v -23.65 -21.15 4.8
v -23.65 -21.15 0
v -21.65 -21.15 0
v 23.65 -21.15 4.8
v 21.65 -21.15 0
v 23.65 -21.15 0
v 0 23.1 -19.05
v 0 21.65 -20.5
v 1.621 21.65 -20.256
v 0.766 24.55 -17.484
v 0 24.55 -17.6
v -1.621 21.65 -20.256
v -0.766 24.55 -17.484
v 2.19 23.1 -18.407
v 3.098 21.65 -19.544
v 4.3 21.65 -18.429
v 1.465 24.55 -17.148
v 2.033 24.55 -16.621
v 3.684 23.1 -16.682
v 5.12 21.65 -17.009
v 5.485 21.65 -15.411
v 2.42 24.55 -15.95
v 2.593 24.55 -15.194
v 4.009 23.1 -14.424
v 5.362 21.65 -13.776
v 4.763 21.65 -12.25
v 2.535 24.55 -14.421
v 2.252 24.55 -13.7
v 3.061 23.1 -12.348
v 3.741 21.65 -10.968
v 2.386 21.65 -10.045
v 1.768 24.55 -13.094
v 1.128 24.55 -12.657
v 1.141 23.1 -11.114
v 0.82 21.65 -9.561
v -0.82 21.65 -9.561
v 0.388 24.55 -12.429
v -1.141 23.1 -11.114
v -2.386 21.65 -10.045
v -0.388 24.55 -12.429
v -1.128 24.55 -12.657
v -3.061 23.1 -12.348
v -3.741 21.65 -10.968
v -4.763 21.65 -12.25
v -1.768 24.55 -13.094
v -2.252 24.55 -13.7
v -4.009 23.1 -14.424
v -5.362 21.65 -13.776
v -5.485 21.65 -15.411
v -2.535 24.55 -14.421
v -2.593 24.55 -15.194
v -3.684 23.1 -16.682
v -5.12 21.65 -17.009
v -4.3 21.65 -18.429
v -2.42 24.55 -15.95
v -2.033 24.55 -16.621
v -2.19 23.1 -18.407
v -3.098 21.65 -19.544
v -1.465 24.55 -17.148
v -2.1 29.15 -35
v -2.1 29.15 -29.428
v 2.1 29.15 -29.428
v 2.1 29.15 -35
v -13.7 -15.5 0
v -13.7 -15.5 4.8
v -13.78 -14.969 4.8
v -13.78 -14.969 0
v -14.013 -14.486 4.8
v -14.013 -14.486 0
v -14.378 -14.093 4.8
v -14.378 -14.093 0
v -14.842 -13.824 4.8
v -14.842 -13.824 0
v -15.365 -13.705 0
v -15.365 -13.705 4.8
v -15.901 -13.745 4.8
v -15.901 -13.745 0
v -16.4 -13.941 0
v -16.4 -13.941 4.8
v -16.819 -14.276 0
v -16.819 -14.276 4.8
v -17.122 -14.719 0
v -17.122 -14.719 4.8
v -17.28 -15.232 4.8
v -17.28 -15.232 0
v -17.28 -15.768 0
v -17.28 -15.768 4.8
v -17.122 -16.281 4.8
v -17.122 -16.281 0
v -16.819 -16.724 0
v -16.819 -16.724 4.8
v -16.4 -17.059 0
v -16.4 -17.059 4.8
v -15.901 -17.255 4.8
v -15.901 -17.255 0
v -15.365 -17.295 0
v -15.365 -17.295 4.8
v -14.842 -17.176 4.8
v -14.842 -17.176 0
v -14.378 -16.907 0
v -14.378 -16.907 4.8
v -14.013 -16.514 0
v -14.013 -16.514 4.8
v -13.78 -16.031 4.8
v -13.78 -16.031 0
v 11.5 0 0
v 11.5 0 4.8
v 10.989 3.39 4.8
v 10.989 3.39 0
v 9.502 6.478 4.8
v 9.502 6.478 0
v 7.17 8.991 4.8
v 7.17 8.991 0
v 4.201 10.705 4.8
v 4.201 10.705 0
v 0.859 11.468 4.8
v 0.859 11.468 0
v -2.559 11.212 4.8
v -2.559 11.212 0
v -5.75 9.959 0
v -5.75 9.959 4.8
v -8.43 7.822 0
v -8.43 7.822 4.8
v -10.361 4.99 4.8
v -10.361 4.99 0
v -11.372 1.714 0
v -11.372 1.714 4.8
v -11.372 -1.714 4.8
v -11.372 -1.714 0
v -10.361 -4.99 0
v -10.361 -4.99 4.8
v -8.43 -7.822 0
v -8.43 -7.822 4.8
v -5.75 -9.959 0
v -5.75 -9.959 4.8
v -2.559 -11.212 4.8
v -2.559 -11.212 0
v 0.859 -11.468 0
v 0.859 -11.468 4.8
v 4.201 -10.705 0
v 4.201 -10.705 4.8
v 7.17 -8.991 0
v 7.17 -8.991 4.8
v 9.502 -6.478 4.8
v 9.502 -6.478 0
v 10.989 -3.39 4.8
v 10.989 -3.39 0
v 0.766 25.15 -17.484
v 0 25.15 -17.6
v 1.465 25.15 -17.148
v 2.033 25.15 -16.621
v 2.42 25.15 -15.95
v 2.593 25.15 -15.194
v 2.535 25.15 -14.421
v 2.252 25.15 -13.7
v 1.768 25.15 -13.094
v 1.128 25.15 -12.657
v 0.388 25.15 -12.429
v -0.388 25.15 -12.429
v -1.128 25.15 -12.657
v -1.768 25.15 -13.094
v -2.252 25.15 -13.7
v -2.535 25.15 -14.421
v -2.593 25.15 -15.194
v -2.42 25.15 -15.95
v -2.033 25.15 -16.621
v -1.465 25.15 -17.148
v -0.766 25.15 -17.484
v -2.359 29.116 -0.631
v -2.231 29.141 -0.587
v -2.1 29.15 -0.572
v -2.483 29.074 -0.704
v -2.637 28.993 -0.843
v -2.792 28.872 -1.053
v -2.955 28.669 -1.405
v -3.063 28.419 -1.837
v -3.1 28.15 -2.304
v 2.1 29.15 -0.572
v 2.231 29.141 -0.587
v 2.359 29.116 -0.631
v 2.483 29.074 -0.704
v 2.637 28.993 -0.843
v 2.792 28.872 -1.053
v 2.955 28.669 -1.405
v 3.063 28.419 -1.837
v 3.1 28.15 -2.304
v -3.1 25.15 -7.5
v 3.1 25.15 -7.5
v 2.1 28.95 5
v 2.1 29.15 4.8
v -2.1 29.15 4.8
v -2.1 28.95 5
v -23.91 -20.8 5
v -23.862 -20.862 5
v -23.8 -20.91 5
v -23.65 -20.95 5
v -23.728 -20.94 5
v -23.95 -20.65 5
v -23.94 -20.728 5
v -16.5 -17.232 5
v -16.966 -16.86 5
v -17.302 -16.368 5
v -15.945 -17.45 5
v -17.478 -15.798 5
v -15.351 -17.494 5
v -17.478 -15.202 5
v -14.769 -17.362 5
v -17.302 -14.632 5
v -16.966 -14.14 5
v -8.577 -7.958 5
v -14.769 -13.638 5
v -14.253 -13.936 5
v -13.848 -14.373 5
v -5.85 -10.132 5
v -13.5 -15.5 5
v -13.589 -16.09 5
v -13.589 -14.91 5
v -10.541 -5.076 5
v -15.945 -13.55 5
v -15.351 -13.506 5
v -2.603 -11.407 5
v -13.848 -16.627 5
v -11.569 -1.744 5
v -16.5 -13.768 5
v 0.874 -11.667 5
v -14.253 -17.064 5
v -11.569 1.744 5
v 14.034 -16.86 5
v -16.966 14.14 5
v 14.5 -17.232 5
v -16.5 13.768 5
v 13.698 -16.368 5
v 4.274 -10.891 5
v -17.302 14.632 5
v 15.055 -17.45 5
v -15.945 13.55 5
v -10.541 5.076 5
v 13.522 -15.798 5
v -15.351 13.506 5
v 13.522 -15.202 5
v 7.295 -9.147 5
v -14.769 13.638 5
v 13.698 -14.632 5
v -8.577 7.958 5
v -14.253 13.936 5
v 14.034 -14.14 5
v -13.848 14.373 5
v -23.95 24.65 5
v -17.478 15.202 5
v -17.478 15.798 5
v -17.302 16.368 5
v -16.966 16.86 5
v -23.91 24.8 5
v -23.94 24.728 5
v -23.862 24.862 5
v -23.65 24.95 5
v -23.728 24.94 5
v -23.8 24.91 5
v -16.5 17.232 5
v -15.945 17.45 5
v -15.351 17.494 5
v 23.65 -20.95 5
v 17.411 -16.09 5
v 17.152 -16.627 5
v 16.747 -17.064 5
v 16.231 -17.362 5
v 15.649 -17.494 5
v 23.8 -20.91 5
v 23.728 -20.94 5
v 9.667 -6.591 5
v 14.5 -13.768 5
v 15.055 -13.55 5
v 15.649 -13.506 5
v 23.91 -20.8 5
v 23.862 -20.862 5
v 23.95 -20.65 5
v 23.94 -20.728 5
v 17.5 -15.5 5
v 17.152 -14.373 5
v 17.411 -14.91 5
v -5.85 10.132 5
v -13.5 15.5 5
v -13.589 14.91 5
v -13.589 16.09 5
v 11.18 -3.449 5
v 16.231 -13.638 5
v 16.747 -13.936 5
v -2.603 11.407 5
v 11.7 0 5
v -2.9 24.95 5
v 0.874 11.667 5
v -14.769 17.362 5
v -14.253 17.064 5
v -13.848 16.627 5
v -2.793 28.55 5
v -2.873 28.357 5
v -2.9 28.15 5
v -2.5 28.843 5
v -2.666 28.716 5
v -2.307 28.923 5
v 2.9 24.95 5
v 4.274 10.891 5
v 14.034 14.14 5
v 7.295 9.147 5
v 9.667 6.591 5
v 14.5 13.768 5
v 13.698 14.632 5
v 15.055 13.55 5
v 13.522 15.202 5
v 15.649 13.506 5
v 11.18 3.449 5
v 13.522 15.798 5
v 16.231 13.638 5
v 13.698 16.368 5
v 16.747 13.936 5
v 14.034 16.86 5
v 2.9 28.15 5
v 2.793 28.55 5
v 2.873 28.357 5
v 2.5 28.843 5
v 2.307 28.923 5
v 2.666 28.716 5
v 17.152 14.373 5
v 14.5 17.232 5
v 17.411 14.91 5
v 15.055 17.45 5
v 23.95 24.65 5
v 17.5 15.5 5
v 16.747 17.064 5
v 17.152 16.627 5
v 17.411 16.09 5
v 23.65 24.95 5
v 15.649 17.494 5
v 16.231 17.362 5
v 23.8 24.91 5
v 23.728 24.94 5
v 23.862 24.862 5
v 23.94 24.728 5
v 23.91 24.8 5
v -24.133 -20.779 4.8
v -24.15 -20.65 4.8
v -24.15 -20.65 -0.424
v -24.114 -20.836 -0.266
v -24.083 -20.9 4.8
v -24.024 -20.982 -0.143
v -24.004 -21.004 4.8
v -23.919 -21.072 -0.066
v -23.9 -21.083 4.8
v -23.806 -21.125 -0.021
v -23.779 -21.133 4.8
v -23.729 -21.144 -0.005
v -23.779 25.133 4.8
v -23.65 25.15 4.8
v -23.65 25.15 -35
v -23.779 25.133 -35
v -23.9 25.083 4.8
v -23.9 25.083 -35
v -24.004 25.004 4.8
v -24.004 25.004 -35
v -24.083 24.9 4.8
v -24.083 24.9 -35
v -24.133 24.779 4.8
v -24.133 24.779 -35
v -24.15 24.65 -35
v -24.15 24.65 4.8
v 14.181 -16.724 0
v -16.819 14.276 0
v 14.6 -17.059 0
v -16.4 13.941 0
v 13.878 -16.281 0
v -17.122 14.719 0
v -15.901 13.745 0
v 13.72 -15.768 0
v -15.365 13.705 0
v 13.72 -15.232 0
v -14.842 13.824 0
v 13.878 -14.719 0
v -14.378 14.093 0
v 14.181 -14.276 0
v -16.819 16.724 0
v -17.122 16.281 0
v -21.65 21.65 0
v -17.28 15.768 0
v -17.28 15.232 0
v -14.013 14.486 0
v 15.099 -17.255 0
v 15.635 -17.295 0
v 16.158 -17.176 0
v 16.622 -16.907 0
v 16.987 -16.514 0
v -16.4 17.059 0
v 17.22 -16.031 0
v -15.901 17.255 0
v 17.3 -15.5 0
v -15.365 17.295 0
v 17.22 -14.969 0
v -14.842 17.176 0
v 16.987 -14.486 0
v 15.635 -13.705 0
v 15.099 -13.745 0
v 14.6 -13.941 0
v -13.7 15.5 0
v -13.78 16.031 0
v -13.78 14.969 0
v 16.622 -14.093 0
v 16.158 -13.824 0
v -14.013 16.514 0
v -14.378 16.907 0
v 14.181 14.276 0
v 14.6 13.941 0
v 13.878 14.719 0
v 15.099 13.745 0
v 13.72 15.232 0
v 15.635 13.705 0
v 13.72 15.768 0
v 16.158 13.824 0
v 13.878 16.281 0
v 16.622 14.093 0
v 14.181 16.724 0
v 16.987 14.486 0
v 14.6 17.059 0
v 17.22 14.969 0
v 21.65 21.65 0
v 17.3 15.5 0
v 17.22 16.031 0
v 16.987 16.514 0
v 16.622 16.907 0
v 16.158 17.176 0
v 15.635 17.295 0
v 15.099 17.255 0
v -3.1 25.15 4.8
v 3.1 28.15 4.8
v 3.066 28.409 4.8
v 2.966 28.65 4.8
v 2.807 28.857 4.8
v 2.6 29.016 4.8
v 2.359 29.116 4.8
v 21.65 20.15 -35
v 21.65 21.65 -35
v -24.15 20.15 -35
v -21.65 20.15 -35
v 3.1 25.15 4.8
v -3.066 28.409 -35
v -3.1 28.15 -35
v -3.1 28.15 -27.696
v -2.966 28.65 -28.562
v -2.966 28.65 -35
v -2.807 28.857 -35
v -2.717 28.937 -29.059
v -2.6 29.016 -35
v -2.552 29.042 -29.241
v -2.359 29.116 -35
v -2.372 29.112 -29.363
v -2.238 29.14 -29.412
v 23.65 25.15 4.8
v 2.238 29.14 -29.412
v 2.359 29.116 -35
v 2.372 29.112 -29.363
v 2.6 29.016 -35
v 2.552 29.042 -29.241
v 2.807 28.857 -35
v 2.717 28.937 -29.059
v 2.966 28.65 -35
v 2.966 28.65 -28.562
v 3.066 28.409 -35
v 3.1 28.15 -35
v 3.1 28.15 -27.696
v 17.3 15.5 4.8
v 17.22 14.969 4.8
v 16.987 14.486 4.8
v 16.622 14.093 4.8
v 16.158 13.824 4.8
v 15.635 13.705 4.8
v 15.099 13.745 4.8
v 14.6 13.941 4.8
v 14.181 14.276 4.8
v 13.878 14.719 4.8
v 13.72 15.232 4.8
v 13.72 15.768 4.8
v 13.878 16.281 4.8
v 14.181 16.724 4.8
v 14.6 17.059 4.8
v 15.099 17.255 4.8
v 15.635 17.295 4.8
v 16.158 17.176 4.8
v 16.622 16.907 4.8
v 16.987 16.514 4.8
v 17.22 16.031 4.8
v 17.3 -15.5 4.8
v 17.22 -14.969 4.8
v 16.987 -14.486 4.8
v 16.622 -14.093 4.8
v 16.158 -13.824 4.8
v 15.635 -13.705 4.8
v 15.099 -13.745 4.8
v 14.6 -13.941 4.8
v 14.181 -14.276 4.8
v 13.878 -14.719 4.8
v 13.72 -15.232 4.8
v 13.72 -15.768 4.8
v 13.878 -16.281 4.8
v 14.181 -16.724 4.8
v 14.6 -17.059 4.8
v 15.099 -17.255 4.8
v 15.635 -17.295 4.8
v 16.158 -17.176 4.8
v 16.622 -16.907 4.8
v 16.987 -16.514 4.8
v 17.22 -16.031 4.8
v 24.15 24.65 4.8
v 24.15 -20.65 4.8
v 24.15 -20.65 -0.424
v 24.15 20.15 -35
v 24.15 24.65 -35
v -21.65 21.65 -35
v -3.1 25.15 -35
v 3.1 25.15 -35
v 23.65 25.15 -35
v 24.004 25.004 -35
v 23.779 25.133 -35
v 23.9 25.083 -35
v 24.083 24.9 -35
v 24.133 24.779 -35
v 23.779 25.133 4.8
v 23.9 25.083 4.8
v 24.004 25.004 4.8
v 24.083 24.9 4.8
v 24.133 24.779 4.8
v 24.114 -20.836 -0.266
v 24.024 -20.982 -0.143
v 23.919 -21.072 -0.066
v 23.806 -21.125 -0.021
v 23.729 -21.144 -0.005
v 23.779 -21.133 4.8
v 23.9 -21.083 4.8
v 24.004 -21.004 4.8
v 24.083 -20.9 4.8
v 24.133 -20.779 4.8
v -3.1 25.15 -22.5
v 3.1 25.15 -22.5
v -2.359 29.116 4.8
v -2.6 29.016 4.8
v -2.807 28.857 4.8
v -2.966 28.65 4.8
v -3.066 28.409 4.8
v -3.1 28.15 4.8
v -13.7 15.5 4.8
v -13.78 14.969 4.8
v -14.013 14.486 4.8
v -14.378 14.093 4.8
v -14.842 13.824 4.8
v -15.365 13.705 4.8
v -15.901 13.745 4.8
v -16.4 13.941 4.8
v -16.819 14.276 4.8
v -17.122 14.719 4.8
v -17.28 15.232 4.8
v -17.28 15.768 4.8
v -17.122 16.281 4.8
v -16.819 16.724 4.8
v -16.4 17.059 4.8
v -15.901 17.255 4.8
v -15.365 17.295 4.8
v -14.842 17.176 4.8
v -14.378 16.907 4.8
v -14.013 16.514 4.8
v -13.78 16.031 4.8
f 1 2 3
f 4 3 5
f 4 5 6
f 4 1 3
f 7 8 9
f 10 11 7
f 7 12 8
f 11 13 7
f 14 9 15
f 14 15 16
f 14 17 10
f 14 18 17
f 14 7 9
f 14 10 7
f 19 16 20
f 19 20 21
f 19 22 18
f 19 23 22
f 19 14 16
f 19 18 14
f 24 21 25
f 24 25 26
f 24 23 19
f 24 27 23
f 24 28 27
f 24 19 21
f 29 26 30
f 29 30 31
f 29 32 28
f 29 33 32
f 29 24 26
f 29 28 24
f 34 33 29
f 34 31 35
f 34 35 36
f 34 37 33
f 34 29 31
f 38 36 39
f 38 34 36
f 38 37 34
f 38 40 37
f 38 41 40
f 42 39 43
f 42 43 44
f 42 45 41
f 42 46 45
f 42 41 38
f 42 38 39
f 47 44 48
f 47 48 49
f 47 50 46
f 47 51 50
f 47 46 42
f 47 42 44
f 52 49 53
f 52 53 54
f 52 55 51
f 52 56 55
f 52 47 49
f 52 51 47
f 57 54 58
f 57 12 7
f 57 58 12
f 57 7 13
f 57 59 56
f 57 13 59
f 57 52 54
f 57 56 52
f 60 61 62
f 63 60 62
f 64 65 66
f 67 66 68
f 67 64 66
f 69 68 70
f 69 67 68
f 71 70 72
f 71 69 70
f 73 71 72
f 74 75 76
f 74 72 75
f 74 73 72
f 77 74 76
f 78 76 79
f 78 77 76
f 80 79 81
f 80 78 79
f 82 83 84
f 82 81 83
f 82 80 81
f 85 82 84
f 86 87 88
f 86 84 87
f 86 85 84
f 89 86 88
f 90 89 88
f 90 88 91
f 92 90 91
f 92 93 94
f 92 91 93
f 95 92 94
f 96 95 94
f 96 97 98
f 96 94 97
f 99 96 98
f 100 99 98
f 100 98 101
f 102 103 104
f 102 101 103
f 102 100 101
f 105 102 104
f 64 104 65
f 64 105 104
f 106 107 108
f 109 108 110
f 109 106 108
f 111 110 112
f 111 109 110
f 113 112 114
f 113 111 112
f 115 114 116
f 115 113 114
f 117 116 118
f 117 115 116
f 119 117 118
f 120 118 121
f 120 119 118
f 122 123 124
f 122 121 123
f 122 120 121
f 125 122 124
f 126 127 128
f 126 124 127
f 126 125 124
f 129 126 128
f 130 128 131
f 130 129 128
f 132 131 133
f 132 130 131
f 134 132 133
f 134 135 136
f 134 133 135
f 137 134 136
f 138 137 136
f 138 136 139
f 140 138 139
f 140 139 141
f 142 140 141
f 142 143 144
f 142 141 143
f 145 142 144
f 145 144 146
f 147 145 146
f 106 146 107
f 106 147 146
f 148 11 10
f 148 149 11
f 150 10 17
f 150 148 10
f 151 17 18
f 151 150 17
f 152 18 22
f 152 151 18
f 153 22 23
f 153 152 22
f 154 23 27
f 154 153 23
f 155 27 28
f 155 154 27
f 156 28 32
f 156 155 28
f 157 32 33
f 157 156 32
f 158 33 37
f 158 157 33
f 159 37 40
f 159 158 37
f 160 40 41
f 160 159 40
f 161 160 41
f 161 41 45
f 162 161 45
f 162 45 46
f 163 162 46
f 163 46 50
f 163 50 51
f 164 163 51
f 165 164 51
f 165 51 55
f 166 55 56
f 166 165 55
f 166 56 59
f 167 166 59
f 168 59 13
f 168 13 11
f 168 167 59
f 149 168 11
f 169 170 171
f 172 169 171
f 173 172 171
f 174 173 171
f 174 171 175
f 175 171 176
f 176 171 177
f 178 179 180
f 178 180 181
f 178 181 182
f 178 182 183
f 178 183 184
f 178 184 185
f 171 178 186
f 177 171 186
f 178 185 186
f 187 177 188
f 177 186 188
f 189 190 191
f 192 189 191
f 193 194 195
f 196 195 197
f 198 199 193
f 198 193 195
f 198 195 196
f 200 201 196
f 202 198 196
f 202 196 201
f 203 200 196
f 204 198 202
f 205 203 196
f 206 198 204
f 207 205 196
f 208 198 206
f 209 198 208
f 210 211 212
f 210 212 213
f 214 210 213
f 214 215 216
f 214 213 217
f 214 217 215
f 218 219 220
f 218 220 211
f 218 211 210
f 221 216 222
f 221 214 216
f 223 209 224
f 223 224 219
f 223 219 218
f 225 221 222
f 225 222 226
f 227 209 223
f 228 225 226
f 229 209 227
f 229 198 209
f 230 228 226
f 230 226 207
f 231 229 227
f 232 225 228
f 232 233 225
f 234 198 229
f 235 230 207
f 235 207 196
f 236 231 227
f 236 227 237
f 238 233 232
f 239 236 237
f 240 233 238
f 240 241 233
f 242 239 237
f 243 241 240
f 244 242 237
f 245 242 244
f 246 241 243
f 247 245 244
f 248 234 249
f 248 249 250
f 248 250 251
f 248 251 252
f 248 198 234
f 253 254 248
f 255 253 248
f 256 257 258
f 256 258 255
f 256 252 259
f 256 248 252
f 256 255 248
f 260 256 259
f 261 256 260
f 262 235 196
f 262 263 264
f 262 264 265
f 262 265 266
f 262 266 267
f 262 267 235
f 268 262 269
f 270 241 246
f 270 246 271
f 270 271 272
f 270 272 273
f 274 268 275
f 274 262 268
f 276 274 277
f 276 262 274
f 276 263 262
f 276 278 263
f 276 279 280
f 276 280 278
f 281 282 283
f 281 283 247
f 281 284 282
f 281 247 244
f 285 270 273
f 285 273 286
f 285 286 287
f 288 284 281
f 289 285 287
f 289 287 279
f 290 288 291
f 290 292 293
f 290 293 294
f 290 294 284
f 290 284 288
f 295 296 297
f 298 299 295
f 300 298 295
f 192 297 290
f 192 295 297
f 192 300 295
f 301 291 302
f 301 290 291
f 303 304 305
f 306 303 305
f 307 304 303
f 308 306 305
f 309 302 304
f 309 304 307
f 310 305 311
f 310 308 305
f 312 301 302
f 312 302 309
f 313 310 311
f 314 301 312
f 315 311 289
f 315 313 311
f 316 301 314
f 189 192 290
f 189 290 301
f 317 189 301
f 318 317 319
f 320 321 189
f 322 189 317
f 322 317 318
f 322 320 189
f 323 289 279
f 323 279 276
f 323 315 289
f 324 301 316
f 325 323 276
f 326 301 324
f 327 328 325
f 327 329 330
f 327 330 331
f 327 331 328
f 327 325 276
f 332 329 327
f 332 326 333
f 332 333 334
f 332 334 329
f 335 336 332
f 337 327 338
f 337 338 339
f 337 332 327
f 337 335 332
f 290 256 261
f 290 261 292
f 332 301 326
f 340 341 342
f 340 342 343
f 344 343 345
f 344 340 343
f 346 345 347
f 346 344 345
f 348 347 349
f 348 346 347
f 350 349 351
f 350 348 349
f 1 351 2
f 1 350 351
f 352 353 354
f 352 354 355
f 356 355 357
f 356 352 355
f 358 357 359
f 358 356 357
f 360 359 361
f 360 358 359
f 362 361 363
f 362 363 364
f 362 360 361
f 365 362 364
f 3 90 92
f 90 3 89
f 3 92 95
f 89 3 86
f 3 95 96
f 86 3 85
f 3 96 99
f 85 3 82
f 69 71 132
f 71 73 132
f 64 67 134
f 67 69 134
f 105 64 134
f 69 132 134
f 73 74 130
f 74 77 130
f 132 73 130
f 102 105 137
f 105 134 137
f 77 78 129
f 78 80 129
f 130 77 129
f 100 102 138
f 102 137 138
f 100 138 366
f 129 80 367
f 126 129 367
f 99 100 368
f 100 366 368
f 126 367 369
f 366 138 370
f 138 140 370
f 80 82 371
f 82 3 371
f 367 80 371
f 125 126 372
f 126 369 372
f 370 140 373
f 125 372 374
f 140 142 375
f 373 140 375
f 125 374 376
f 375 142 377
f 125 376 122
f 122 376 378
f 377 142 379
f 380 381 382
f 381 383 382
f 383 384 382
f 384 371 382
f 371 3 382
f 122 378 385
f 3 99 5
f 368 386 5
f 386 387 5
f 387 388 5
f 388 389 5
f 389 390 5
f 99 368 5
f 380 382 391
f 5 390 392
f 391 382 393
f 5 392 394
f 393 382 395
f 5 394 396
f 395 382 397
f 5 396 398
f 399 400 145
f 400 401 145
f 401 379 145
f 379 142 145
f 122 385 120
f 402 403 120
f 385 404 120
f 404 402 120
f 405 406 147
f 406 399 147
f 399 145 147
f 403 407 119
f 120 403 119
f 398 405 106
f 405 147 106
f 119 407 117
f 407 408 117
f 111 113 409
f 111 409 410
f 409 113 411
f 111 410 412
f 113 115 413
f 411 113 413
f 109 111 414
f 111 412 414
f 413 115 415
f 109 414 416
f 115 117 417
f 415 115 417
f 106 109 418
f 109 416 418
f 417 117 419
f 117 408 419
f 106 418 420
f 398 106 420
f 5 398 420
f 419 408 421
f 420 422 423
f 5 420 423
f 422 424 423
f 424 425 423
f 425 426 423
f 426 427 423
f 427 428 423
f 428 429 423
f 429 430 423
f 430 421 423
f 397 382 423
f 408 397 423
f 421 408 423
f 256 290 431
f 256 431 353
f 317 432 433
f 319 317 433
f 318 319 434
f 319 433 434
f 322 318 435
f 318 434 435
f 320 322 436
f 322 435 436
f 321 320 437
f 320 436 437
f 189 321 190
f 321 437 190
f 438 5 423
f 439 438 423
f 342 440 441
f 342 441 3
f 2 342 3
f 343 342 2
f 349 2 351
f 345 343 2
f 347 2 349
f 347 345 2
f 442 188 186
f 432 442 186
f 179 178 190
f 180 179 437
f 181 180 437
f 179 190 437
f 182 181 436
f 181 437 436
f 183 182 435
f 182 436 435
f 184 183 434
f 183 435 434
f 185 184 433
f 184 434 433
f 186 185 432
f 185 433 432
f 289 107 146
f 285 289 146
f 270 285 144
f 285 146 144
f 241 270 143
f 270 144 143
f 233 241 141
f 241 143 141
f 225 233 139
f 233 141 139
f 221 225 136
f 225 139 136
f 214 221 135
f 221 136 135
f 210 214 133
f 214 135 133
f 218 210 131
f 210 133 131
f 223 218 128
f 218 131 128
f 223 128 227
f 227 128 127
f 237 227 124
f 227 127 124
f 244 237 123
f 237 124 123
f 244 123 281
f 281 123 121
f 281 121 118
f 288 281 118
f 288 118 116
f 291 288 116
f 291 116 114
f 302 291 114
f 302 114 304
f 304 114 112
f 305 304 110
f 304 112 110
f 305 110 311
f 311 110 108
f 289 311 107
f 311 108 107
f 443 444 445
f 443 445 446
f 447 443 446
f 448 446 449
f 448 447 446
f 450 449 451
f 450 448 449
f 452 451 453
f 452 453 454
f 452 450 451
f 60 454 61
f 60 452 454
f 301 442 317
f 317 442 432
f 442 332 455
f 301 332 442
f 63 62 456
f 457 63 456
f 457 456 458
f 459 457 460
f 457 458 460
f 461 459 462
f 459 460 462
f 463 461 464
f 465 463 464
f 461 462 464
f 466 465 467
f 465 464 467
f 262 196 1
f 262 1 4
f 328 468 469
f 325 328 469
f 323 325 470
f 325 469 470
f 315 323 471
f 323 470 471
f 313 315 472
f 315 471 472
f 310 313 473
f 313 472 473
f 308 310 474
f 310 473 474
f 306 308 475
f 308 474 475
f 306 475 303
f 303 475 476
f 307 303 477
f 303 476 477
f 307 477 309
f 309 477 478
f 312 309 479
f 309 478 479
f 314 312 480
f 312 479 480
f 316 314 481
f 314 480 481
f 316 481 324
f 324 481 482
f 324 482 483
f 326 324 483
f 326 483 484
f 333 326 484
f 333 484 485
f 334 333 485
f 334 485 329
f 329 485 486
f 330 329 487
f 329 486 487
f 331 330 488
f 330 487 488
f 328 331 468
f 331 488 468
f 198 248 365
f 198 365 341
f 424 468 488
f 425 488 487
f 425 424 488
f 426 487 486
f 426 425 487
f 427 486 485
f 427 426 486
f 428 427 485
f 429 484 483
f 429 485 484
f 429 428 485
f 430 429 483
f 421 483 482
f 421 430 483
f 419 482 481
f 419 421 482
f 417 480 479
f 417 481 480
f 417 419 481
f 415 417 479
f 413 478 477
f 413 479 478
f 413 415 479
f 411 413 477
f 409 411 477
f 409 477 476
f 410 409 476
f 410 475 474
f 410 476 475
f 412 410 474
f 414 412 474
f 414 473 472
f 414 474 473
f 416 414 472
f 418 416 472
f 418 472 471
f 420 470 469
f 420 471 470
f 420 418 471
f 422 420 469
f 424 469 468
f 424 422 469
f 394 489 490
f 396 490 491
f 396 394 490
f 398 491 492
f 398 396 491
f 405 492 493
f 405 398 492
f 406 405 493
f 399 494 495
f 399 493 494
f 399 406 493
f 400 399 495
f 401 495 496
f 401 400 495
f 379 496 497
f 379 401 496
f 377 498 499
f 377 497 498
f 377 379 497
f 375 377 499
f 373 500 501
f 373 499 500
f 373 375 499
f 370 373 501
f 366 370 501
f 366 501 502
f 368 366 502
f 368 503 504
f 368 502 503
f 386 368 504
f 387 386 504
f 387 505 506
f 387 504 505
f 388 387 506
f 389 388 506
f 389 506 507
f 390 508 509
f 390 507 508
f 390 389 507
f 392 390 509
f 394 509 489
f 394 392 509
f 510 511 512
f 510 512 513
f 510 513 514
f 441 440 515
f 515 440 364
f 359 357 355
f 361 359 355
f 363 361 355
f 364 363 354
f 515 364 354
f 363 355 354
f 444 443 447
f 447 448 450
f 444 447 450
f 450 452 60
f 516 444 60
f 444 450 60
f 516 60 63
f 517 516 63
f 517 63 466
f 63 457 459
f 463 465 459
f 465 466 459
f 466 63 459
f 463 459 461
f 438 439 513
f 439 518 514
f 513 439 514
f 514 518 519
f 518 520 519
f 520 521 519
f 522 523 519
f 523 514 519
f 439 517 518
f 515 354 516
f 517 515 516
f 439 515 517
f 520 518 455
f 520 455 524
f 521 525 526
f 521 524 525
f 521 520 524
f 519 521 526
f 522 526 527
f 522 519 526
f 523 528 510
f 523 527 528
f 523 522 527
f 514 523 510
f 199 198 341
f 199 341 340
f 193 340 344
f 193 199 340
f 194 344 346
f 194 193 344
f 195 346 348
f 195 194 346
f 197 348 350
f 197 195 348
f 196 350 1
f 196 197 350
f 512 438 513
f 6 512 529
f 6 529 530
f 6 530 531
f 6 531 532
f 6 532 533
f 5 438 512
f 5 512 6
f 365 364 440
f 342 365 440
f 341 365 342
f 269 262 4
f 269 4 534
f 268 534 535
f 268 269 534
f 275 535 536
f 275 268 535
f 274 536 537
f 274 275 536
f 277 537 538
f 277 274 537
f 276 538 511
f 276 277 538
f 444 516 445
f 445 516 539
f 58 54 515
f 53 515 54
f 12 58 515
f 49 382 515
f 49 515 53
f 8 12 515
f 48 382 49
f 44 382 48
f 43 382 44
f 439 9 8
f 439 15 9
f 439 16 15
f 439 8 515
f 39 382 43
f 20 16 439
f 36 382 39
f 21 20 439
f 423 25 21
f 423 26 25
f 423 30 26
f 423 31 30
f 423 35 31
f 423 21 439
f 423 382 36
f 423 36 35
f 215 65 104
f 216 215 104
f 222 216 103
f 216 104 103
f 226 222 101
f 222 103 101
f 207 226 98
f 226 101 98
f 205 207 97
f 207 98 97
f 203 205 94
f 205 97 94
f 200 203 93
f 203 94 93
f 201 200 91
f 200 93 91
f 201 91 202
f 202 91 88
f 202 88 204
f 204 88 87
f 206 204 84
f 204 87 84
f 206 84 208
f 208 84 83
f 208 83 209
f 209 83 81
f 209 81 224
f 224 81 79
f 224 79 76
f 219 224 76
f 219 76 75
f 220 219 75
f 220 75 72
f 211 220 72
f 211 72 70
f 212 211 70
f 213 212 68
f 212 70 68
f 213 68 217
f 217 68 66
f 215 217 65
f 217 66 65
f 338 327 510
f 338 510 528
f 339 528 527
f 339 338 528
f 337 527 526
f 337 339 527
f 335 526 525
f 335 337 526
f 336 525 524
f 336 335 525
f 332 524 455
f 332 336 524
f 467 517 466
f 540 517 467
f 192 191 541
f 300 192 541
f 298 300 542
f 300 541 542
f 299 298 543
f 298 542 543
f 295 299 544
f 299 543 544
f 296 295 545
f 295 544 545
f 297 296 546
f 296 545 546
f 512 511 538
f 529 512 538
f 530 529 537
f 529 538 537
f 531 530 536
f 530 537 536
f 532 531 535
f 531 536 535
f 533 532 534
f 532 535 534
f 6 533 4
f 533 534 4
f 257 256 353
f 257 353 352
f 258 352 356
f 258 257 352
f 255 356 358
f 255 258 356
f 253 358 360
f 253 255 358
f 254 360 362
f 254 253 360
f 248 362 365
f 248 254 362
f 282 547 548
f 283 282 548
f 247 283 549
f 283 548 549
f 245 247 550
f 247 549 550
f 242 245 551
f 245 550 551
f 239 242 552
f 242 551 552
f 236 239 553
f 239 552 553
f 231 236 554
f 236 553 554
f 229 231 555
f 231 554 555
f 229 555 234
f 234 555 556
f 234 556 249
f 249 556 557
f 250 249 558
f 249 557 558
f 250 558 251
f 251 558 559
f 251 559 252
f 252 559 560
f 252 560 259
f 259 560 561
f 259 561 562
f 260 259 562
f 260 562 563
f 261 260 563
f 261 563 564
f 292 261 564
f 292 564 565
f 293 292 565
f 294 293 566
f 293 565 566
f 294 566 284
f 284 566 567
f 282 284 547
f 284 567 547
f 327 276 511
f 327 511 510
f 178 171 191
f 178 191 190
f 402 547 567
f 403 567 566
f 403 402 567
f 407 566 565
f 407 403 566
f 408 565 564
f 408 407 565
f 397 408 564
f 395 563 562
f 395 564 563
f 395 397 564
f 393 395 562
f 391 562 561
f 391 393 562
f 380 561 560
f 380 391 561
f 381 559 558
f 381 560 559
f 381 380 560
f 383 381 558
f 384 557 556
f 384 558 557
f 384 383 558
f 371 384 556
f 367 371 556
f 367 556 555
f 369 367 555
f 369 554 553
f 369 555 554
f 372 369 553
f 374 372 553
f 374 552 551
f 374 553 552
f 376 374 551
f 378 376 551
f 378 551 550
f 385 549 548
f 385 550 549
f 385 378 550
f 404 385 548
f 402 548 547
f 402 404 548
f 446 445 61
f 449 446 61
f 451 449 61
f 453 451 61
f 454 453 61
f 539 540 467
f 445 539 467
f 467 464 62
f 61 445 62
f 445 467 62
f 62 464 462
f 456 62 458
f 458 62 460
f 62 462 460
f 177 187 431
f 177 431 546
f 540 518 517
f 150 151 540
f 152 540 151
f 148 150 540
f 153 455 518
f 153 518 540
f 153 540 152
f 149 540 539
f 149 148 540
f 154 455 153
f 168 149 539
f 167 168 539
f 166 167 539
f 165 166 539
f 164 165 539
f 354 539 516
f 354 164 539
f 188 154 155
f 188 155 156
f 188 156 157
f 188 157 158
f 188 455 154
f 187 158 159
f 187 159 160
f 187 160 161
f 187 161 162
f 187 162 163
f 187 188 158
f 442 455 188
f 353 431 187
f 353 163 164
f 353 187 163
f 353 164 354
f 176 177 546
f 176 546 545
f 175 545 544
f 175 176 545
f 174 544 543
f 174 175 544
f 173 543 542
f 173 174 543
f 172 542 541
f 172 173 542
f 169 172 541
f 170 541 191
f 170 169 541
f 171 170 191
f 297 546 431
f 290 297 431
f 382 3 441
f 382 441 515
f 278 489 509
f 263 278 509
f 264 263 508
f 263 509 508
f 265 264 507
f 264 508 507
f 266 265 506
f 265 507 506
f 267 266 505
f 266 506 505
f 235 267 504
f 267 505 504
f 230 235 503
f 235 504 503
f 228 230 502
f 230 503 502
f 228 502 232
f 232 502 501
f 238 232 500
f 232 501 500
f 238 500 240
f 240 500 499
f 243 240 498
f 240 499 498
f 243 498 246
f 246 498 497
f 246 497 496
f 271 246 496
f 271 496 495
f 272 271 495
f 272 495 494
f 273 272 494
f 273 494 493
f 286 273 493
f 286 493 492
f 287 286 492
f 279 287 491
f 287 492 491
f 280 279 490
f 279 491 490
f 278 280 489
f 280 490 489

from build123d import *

# Parameters (mm, degrees)
F1_W          = 6.2
F1_H          = 4
F2_DEPTH      = 5
F2_DEPTH_BACK = 35
F3_R          = 1
F5_DEPTH      = 24.151
F5_DEPTH_BACK = 24.151
F6_W          = 43.3
F6_H          = 43.3
F6_R          = 1.8
F6_R_2        = 11.5
F7_DEPTH      = 35.001
F8_DEPTH      = 5.001
F12_R         = 0.5
F13_SIZE      = 0.2


# Not quite as in the source:
# - a feature of the source that left no trace in its solid (it failed there, or was rolled back) is left out


with BuildPart() as f2:
    # F1 (on Top) → F2 (new body, two sides)
    with BuildSketch(Plane.XY) as f2_sk:
        Polygon((-24.15, 25.15), (-24.15, -21.15), (24.15, -21.15), (24.15, 25.15), (3.1, 25.15), (-3.1, 25.15), align=None)
        with Locations((0, 27.15)):
            Rectangle(F1_W, F1_H)
    extrude(amount=F2_DEPTH)
    extrude(f2_sk.sketch, amount=-F2_DEPTH_BACK)

    # F3
    f3_edges = [f2.edges().sort_by_distance(p)[0] for p in [
        (-3.1, 29.15, -15),
        (3.1, 29.15, -15),
    ]]
    fillet(f3_edges, radius=F3_R)

    # F4 (on Right) → F5 (cut, two sides)
    with BuildSketch(Plane.YZ) as f5_sk:
        Polygon((20.15, -35), (-21.15, 0), (-21.15, -35), align=None)
        Polygon((34.9199817246, 9.422104736), (25.15, -7.5), (25.15, -22.5), (34.9199817246, -39.422104736), align=None)
    extrude(amount=-F5_DEPTH, mode=Mode.SUBTRACT)
    extrude(f5_sk.sketch, amount=F5_DEPTH_BACK, mode=Mode.SUBTRACT)

    # F6 (on Top) → F7 (cut, through all)
    with BuildSketch(Plane.XY):
        Rectangle(F6_W, F6_H)
        with Locations((-15.5, -15.5)):
            Circle(F6_R, mode=Mode.SUBTRACT)
        with Locations((15.5, -15.5)):
            Circle(F6_R, mode=Mode.SUBTRACT)
        with Locations((-15.5, 15.5)):
            Circle(F6_R, mode=Mode.SUBTRACT)
        Circle(F6_R_2, mode=Mode.SUBTRACT)
        with Locations((15.5, 15.5)):
            Circle(F6_R, mode=Mode.SUBTRACT)
        with Locations((-15.5, -15.5)):
            Circle(F6_R)
        with Locations((-15.5, 15.5)):
            Circle(F6_R)
        Circle(F6_R_2)
        with Locations((15.5, 15.5)):
            Circle(F6_R)
        with Locations((15.5, -15.5)):
            Circle(F6_R)
    extrude(amount=-F7_DEPTH, mode=Mode.SUBTRACT)

    # F6 (on Top) → F8 (cut, through all)
    with BuildSketch(Plane.XY):
        Circle(F6_R_2)
        with Locations((-15.5, -15.5)):
            Circle(F6_R)
        with Locations((15.5, -15.5)):
            Circle(F6_R)
        with Locations((15.5, 15.5)):
            Circle(F6_R)
        with Locations((-15.5, 15.5)):
            Circle(F6_R)
    extrude(amount=F8_DEPTH, mode=Mode.SUBTRACT)

    # F9 (on Right) → F10 (revolve, cut)
    with BuildSketch(Plane.YZ):
        Polygon((25.15, -17.6), (25.15, -15), (21.65, -15), (21.65, -20.5), (24.55, -17.6), align=None)
    revolve(axis=Axis((0, 23.4, -15), (0, -1, 0)), mode=Mode.SUBTRACT)

    # F12
    f12_edges = [f2.edges().sort_by_distance(p)[0] for p in [
        (24.15, 25.15, -15),
        (-24.15, 25.15, -15),
        (-24.15, -21.15, 2.5),
        (24.15, -21.15, 2.5),
    ]]
    fillet(f12_edges, radius=F12_R)

    # F13
    f13_edges = [f2.edges().sort_by_distance(p)[0] for p in [
        (13.375, 25.15, 5),
        (24.003553, 25.003553, 5),
        (3.1, 26.65, 5),
        (24.15, 2, 5),
        (2.807107, 28.857107, 5),
        (24.003553, -21.003553, 5),
        (0, 29.15, 5),
        (0, -21.15, 5),
        (-2.807107, 28.857107, 5),
        (-24.003553, -21.003553, 5),
        (-3.1, 26.65, 5),
        (-24.15, 2, 5),
        (-13.375, 25.15, 5),
        (-24.003553, 25.003553, 5),
        (-17.3, -15.5, 5),
        (13.7, -15.5, 5),
        (-11.5, 0, 5),
        (-17.3, 15.5, 5),
        (13.7, 15.5, 5),
    ]]
    chamfer(f13_edges, length=F13_SIZE)


solid = f2.part
